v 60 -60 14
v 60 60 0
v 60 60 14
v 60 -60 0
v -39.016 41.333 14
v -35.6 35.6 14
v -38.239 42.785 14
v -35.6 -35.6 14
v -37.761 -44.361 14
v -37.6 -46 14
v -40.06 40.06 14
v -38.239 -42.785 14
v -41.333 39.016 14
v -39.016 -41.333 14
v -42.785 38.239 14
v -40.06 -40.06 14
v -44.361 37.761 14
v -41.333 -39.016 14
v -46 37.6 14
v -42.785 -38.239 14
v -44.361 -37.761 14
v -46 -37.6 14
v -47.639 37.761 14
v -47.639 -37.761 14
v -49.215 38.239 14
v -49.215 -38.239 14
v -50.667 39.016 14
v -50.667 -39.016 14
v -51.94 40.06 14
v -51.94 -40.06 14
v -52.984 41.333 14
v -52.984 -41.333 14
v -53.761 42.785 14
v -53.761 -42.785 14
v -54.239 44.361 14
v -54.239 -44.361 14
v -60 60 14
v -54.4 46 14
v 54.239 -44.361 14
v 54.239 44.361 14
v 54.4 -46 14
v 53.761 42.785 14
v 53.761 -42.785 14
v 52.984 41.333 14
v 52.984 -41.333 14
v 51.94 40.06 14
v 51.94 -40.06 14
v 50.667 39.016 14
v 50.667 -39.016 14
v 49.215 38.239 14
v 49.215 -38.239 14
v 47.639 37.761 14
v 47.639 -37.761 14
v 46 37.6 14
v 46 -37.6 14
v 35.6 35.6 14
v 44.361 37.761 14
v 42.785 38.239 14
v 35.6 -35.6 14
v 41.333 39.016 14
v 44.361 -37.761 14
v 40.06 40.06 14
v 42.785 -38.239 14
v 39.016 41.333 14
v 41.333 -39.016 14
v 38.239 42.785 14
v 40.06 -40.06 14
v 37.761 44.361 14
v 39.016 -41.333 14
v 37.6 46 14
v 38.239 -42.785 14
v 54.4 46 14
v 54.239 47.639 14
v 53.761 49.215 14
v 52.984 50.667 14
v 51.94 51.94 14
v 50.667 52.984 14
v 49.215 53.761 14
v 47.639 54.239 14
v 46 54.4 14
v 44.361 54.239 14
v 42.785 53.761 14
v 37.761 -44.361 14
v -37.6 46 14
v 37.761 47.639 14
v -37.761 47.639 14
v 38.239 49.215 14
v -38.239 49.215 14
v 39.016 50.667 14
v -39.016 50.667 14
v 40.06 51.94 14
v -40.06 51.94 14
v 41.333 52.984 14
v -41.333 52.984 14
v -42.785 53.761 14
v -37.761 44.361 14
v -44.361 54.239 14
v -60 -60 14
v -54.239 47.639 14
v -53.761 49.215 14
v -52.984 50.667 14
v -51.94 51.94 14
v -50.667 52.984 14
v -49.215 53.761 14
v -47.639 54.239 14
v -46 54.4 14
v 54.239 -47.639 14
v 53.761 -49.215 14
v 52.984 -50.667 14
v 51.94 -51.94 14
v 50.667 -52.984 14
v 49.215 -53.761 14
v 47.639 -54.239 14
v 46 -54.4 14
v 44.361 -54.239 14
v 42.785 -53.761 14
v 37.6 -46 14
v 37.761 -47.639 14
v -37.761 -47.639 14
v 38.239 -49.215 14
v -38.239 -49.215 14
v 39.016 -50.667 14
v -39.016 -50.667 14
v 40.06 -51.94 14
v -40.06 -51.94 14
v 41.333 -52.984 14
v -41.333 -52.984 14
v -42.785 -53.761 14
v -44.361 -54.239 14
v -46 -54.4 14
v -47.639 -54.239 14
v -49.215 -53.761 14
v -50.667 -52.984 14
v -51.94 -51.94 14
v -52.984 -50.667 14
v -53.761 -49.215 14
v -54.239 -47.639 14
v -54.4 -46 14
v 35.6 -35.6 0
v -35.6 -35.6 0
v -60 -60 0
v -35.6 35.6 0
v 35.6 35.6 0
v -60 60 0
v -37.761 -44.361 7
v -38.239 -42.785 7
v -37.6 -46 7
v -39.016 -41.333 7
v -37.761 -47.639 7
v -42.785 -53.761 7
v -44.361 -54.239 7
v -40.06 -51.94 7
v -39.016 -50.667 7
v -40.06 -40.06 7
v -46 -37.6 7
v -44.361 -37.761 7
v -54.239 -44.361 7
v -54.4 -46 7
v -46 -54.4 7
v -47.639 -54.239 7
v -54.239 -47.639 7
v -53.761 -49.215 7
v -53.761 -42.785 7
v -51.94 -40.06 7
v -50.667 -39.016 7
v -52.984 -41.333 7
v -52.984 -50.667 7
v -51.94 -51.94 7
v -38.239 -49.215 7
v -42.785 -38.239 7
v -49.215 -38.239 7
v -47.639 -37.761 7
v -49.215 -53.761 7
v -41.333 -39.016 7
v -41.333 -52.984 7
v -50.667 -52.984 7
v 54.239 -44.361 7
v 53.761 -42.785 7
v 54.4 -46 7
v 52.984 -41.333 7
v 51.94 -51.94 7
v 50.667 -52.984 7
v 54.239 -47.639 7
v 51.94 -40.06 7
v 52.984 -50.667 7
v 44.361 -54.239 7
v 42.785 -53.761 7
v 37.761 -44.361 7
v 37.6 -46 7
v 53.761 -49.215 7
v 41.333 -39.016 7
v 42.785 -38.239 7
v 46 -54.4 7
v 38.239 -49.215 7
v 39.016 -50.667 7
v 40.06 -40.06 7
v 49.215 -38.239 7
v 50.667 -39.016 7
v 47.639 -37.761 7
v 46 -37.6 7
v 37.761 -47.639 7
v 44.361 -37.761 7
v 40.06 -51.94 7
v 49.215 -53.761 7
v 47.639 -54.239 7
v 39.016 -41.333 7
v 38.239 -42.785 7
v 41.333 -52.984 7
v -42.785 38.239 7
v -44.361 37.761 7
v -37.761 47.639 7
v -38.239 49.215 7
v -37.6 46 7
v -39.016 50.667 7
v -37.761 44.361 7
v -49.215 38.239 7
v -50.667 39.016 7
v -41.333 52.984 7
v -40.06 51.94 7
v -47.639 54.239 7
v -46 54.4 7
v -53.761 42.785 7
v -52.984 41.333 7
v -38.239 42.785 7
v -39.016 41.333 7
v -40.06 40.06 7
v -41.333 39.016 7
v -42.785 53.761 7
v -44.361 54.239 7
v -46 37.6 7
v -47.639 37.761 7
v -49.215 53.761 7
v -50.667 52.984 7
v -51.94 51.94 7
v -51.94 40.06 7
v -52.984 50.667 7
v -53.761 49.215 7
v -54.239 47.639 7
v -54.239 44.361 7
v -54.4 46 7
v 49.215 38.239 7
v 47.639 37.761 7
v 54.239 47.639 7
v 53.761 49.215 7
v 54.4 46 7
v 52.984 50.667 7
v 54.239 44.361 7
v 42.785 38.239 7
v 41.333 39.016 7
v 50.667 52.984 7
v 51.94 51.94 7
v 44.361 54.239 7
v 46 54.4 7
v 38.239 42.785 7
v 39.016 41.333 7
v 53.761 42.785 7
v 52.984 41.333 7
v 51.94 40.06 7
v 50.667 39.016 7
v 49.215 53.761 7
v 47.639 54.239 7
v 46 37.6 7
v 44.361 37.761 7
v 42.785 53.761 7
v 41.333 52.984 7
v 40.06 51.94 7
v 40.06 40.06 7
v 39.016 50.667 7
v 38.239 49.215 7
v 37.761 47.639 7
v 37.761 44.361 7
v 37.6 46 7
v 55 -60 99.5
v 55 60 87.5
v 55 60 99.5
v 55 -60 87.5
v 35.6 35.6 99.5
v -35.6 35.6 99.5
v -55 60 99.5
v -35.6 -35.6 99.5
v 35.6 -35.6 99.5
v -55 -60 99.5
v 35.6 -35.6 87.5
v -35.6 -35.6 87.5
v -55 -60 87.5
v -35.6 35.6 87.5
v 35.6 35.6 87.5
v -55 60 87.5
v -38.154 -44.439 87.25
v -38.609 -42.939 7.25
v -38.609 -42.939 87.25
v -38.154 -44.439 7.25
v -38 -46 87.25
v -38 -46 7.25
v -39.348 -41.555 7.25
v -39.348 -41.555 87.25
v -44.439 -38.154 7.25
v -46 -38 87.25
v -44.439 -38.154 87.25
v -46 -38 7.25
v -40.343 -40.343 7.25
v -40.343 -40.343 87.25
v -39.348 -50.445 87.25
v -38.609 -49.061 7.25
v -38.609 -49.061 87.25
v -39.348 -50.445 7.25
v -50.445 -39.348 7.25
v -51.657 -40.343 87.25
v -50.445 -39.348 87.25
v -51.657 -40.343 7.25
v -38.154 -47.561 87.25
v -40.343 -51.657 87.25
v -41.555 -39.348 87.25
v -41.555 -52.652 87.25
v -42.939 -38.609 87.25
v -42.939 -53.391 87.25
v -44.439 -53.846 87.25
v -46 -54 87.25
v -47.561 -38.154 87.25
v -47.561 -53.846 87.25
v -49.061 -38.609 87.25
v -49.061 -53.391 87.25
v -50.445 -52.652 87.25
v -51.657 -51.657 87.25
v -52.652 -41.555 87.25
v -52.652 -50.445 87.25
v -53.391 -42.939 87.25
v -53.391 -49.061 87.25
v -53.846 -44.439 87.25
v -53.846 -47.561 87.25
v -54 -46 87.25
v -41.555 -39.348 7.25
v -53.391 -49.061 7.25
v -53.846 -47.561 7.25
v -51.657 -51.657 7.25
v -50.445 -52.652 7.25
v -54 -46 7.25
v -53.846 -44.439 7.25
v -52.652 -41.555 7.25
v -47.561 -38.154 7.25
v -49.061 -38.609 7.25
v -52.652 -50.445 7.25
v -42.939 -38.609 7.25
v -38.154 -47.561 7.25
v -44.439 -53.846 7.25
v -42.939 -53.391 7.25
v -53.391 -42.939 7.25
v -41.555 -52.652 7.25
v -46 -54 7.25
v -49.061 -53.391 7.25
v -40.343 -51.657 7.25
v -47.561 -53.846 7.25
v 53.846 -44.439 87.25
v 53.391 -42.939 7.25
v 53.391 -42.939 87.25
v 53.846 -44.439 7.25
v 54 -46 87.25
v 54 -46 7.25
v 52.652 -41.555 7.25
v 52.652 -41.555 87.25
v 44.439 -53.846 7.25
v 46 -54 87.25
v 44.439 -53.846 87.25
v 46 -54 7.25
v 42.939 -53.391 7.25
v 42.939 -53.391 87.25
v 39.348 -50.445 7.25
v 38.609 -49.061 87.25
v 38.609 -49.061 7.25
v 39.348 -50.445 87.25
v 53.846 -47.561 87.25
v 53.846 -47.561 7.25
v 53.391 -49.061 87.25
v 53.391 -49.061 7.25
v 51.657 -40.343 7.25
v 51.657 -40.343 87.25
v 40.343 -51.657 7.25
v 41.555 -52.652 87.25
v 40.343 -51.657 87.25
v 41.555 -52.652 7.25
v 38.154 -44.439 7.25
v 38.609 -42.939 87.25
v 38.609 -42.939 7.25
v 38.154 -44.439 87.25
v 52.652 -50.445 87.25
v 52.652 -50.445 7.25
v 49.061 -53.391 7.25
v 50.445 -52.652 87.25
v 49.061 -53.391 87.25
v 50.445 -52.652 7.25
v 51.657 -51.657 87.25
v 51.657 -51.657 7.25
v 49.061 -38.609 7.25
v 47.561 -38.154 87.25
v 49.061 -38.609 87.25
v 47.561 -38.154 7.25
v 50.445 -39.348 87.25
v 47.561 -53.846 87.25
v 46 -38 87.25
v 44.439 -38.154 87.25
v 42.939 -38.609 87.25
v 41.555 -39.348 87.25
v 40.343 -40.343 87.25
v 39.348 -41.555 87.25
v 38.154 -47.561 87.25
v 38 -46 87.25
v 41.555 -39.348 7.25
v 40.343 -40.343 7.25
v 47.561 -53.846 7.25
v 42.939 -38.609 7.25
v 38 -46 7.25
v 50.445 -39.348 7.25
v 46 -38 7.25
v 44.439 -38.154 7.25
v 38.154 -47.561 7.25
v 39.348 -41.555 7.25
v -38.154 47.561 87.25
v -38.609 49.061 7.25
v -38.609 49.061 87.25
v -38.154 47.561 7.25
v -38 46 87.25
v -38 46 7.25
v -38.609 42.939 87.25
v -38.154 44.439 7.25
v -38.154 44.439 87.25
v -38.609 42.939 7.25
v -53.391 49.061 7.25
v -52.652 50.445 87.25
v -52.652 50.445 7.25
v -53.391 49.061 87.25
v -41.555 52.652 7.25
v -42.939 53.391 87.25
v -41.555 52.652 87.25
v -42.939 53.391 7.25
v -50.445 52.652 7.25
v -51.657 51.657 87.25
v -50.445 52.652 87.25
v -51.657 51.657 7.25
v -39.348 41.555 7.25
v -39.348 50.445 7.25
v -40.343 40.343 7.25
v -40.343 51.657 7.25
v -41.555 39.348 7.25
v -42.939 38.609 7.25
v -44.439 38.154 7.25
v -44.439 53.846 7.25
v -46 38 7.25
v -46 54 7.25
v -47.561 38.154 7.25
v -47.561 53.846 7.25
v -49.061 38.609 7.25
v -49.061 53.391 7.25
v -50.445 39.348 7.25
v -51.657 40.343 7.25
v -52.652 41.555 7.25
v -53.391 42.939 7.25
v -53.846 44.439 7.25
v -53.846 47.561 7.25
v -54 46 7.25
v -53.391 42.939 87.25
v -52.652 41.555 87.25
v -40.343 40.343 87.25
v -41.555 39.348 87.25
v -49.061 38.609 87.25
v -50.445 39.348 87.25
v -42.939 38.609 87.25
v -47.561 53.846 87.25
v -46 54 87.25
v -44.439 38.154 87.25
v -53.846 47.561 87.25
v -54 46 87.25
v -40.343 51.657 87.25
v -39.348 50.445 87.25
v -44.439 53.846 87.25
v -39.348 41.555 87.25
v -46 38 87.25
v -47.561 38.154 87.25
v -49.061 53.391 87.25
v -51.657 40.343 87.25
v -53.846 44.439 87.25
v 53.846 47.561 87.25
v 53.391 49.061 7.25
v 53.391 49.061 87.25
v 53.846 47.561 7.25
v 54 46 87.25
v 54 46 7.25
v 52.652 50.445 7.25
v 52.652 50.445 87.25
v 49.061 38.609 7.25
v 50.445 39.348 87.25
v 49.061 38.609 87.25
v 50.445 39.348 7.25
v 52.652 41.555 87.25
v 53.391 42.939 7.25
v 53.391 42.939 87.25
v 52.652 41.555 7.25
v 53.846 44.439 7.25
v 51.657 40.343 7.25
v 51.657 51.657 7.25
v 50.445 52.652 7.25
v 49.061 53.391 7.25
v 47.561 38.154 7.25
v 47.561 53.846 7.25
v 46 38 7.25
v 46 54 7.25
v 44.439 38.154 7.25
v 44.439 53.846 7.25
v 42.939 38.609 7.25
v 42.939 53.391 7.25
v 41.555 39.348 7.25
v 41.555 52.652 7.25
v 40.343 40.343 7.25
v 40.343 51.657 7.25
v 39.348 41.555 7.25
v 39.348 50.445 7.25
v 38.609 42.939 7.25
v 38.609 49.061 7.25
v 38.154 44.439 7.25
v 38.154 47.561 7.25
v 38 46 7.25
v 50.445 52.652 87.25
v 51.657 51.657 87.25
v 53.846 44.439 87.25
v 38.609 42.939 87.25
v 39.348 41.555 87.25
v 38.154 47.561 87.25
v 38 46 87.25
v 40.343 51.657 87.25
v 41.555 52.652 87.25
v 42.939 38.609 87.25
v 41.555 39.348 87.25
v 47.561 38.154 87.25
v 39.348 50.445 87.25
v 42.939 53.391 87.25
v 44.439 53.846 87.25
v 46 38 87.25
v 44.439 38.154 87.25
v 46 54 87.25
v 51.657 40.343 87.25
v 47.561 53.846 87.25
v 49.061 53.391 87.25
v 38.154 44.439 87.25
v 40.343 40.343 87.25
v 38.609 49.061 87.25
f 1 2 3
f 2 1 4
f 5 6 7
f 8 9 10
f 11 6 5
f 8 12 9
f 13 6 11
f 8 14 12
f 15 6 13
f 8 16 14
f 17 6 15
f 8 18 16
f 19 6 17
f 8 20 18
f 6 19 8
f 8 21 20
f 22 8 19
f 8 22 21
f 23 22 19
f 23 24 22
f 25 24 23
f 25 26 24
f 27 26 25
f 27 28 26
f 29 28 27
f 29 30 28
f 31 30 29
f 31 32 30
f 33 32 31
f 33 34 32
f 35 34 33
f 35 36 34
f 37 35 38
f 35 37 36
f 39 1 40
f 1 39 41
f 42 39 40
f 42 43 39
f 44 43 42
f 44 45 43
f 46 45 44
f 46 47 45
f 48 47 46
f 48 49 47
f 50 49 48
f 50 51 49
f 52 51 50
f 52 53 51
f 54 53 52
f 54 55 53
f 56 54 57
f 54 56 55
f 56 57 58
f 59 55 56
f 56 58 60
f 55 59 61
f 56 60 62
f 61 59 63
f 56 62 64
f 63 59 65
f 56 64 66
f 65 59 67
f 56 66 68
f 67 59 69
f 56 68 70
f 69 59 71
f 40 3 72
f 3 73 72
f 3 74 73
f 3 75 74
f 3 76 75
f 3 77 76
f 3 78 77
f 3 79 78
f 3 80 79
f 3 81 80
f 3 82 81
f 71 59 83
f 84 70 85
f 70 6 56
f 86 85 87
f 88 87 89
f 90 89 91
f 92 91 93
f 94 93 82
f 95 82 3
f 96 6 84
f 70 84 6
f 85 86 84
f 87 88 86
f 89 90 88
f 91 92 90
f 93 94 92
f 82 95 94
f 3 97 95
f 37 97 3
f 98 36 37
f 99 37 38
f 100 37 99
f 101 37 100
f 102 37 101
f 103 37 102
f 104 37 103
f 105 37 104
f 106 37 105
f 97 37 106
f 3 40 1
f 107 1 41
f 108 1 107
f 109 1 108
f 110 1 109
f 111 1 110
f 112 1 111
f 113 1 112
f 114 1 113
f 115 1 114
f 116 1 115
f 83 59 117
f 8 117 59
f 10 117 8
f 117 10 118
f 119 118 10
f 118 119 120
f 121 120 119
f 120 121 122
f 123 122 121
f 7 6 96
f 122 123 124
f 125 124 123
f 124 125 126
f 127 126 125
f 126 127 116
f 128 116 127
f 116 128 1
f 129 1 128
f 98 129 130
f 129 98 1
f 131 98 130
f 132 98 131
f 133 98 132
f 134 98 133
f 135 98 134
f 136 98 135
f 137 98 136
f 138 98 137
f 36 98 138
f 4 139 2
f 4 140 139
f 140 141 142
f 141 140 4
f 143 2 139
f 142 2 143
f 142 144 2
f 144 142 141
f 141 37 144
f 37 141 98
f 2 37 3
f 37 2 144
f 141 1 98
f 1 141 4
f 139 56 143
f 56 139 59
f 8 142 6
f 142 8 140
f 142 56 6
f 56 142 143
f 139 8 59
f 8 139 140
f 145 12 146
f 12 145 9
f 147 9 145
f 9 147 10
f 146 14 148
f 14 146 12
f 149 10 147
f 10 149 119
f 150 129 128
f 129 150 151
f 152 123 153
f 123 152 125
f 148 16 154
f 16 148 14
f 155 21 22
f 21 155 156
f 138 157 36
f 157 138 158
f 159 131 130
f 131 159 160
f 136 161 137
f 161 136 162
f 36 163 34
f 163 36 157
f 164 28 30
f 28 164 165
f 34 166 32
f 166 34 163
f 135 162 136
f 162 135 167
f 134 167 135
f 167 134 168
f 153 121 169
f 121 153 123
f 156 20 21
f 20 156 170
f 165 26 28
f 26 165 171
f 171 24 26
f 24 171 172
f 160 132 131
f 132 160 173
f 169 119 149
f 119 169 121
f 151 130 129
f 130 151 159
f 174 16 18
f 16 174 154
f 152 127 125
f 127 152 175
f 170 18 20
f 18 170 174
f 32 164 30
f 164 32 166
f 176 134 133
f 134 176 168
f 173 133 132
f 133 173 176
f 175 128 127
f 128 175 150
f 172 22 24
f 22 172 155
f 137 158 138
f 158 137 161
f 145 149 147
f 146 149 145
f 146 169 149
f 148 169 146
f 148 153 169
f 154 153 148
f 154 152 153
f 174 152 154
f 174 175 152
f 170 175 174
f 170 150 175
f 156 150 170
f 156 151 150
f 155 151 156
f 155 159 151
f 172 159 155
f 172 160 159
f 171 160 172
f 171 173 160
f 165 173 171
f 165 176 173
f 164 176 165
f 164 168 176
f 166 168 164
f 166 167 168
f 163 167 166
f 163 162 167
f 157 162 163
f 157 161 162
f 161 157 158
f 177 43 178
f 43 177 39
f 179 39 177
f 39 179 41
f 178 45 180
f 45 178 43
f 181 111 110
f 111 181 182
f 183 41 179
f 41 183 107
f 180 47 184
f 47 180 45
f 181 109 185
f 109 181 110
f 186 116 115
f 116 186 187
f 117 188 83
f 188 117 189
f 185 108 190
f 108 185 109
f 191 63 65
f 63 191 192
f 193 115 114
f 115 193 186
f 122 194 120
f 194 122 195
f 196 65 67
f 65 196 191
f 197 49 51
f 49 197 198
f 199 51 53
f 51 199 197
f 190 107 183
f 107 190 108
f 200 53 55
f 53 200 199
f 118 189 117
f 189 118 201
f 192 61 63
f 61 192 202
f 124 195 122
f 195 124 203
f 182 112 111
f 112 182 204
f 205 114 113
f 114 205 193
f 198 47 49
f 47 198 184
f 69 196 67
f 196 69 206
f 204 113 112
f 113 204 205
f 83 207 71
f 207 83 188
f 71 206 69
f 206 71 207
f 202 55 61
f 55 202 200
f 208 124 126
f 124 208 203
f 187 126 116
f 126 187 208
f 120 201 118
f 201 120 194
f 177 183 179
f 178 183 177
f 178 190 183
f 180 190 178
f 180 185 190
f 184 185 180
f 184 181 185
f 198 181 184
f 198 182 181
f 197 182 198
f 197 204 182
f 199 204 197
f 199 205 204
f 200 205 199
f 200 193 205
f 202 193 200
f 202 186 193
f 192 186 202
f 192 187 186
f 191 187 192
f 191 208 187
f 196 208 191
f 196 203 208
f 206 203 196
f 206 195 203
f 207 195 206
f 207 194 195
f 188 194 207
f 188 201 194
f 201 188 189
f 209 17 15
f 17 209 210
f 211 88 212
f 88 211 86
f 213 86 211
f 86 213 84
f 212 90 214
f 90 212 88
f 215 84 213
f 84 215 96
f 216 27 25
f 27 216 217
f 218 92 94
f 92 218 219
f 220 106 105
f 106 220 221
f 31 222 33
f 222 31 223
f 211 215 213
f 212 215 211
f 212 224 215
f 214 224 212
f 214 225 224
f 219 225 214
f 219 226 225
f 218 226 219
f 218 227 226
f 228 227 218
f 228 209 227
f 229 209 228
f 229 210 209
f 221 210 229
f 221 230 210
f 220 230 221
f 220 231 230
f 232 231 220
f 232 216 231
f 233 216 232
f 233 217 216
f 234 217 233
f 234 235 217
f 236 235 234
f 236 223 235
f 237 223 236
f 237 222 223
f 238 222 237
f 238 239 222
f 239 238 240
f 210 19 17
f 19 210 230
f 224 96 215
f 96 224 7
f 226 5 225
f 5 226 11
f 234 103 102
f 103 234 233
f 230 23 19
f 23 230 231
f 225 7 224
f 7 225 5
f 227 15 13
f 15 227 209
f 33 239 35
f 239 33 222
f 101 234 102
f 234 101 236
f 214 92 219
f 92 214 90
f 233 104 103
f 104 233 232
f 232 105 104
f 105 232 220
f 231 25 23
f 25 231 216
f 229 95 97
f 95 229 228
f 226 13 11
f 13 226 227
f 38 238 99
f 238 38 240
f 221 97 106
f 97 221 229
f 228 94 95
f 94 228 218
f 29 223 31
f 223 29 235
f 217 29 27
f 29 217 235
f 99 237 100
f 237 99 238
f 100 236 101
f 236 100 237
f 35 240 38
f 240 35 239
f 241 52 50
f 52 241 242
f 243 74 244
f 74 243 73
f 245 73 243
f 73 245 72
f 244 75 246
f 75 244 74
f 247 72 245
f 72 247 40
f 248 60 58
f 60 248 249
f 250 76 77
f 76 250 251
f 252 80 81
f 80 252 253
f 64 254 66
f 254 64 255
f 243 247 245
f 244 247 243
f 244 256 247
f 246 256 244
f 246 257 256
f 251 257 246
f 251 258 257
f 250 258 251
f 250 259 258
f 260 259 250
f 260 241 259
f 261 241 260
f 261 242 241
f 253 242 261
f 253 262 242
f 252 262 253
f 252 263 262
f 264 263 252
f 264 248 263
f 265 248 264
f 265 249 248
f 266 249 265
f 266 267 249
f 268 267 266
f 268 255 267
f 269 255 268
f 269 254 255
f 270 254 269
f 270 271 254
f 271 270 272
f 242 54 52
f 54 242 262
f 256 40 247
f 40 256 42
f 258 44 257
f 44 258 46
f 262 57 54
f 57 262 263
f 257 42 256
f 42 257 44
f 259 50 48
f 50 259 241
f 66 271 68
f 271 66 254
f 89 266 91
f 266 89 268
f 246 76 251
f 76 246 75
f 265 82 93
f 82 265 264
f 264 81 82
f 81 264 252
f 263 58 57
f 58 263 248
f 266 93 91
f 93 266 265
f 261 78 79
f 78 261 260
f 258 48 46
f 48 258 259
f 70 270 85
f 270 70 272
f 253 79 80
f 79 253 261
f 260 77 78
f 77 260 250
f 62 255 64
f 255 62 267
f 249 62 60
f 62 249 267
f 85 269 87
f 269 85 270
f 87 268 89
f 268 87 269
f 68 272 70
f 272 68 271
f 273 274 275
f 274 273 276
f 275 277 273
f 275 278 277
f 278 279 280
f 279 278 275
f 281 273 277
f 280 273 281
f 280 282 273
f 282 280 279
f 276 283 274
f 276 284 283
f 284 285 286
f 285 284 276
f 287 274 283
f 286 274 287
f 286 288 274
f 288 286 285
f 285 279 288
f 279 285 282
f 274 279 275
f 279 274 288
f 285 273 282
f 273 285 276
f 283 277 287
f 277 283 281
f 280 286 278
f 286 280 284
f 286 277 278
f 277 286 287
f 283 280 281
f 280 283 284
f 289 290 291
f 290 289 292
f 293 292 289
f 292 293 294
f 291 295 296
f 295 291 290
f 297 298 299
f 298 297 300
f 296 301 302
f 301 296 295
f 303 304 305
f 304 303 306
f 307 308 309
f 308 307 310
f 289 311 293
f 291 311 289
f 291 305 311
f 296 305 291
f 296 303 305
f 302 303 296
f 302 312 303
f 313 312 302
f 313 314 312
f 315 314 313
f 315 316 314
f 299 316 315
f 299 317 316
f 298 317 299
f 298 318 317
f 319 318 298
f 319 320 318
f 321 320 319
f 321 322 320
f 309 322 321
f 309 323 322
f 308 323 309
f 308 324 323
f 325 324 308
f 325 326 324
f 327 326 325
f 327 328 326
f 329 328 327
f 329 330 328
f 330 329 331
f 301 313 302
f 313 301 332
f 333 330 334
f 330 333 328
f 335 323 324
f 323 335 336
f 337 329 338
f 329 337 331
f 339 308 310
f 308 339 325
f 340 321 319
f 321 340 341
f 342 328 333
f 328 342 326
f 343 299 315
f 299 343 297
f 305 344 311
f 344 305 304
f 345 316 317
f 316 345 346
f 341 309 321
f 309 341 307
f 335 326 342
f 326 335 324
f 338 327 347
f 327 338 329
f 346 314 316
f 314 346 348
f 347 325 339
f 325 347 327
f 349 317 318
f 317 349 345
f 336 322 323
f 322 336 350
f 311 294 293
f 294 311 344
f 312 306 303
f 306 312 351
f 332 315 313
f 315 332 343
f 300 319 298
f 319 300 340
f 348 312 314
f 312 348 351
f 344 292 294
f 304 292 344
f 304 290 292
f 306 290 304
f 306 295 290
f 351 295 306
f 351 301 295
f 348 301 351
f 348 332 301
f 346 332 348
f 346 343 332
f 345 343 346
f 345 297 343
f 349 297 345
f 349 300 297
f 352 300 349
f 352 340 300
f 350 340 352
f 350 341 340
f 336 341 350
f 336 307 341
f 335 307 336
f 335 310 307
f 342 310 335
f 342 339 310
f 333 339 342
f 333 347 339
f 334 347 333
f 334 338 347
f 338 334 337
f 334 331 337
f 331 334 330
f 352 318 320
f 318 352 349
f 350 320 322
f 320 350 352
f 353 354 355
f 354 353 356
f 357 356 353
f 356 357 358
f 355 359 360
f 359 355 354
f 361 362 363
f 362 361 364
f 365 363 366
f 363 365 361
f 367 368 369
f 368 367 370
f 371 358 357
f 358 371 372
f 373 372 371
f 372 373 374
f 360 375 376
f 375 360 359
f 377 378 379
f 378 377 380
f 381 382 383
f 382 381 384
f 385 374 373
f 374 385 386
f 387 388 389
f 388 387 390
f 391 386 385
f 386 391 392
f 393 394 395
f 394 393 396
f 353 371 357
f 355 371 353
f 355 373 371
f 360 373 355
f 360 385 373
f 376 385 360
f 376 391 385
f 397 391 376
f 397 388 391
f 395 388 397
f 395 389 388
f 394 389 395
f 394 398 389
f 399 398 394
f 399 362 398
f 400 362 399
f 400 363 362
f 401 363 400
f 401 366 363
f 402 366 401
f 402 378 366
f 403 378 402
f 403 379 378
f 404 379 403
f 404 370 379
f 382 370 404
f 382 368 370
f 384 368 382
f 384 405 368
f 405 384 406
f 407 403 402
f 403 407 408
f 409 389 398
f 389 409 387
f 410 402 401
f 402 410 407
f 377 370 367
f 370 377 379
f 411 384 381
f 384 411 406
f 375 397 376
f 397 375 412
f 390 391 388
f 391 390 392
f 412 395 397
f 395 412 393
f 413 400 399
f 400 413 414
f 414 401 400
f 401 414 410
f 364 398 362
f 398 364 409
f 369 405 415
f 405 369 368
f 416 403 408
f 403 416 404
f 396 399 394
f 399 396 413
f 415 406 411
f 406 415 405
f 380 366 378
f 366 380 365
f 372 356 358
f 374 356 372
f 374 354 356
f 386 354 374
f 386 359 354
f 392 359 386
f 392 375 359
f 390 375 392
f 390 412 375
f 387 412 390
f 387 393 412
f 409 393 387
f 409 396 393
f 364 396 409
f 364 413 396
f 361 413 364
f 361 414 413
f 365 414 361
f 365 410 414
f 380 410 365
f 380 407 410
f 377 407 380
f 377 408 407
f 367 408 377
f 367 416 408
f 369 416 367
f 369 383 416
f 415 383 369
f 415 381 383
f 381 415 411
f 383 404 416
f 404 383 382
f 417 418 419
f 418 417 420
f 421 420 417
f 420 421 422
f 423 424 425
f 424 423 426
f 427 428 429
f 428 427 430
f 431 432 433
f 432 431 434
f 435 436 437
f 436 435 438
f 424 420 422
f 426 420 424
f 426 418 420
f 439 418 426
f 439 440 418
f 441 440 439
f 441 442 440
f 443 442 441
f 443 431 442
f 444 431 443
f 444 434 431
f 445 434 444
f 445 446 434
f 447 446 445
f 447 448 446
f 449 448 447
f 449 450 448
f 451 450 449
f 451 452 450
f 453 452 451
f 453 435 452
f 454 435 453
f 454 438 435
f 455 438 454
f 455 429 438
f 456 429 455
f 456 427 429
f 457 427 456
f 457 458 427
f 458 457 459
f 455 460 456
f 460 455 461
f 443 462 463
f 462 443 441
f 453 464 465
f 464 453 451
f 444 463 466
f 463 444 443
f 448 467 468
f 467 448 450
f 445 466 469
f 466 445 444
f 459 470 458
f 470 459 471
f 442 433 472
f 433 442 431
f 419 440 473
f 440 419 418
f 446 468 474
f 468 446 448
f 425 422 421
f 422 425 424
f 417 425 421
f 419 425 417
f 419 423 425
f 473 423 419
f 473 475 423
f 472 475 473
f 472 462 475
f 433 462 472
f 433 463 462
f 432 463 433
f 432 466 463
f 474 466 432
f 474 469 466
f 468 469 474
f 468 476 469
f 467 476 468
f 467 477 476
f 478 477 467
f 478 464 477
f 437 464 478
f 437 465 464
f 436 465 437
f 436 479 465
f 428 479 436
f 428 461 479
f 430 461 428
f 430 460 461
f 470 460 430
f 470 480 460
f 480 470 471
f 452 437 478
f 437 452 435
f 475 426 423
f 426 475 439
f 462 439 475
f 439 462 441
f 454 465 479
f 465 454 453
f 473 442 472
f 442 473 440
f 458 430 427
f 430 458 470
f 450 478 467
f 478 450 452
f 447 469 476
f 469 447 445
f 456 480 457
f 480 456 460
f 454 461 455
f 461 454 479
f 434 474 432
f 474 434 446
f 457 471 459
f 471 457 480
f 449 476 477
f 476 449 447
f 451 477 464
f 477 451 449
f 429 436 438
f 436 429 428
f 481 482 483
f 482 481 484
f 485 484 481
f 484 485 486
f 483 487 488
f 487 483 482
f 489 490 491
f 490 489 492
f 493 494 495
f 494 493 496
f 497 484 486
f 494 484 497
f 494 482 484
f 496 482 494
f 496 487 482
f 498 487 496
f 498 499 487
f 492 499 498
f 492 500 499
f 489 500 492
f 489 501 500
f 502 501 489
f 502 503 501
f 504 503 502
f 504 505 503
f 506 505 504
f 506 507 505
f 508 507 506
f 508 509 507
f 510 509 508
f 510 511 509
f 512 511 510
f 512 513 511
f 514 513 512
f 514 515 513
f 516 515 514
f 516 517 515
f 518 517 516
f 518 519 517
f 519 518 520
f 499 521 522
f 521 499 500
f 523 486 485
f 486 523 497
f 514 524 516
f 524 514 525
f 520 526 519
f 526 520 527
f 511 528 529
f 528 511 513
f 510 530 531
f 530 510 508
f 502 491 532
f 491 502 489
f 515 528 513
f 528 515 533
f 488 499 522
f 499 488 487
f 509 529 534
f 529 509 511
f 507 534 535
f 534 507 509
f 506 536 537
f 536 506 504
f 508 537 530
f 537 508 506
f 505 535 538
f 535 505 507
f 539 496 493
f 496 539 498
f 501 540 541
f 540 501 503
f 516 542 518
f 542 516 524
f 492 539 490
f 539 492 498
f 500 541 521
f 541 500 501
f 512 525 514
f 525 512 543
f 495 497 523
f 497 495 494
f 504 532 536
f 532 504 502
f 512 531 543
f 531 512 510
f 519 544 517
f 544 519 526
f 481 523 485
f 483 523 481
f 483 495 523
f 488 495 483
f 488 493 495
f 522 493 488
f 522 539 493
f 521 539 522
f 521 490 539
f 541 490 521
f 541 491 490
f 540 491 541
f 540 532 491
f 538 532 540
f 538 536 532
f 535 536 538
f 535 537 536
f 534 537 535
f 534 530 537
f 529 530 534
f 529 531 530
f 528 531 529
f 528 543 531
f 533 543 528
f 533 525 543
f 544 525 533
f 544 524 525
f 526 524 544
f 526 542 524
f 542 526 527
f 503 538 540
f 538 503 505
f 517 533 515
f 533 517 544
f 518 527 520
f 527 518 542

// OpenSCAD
$fn = 32;

// ------------------------------------------------------------------------
// Frame cube: base 120 x 120 mm, posts 80 mm tall
// Every part is its own module, assembly() places every instance.
// ------------------------------------------------------------------------

// --- part 1 ---
module base_frame() {
  difference() {
    translate([-60, -60, 0]) cube([120, 120, 14]);
    translate([-35.6, -35.6, -1]) cube([71.2, 71.2, 16]);
    translate([-46, -46, 7]) cylinder(h = 8, d = 16.8);
    translate([46, -46, 7]) cylinder(h = 8, d = 16.8);
    translate([-46, 46, 7]) cylinder(h = 8, d = 16.8);
    translate([46, 46, 7]) cylinder(h = 8, d = 16.8);
  }
}

// --- part 2 ---
module corner_post() {
  cylinder(h = 80, d = 16);
}

// --- part 3 ---
module top_frame() {
  difference() {
    translate([-55, -60, 0]) cube([110, 120, 12]);
    translate([-35.6, -35.6, -1]) cube([71.2, 71.2, 14]);
  }
}

// --- assembly ---
module assembly() {
  color([0.80, 0.24, 0.20]) translate([0, 0, 0]) rotate([0, 0, 0]) base_frame();
  color([0.20, 0.45, 0.75]) translate([-46, -46, 7.25]) rotate([0, 0, 0]) corner_post();
  color([0.25, 0.62, 0.32]) translate([46, -46, 7.25]) rotate([0, 0, 0]) corner_post();
  color([0.92, 0.70, 0.18]) translate([-46, 46, 7.25]) rotate([0, 0, 0]) corner_post();
  color([0.58, 0.35, 0.70]) translate([46, 46, 7.25]) rotate([0, 0, 0]) corner_post();
  color([0.16, 0.66, 0.66]) translate([0, 0, 87.5]) rotate([0, 0, 0]) top_frame();
}

assembly();
